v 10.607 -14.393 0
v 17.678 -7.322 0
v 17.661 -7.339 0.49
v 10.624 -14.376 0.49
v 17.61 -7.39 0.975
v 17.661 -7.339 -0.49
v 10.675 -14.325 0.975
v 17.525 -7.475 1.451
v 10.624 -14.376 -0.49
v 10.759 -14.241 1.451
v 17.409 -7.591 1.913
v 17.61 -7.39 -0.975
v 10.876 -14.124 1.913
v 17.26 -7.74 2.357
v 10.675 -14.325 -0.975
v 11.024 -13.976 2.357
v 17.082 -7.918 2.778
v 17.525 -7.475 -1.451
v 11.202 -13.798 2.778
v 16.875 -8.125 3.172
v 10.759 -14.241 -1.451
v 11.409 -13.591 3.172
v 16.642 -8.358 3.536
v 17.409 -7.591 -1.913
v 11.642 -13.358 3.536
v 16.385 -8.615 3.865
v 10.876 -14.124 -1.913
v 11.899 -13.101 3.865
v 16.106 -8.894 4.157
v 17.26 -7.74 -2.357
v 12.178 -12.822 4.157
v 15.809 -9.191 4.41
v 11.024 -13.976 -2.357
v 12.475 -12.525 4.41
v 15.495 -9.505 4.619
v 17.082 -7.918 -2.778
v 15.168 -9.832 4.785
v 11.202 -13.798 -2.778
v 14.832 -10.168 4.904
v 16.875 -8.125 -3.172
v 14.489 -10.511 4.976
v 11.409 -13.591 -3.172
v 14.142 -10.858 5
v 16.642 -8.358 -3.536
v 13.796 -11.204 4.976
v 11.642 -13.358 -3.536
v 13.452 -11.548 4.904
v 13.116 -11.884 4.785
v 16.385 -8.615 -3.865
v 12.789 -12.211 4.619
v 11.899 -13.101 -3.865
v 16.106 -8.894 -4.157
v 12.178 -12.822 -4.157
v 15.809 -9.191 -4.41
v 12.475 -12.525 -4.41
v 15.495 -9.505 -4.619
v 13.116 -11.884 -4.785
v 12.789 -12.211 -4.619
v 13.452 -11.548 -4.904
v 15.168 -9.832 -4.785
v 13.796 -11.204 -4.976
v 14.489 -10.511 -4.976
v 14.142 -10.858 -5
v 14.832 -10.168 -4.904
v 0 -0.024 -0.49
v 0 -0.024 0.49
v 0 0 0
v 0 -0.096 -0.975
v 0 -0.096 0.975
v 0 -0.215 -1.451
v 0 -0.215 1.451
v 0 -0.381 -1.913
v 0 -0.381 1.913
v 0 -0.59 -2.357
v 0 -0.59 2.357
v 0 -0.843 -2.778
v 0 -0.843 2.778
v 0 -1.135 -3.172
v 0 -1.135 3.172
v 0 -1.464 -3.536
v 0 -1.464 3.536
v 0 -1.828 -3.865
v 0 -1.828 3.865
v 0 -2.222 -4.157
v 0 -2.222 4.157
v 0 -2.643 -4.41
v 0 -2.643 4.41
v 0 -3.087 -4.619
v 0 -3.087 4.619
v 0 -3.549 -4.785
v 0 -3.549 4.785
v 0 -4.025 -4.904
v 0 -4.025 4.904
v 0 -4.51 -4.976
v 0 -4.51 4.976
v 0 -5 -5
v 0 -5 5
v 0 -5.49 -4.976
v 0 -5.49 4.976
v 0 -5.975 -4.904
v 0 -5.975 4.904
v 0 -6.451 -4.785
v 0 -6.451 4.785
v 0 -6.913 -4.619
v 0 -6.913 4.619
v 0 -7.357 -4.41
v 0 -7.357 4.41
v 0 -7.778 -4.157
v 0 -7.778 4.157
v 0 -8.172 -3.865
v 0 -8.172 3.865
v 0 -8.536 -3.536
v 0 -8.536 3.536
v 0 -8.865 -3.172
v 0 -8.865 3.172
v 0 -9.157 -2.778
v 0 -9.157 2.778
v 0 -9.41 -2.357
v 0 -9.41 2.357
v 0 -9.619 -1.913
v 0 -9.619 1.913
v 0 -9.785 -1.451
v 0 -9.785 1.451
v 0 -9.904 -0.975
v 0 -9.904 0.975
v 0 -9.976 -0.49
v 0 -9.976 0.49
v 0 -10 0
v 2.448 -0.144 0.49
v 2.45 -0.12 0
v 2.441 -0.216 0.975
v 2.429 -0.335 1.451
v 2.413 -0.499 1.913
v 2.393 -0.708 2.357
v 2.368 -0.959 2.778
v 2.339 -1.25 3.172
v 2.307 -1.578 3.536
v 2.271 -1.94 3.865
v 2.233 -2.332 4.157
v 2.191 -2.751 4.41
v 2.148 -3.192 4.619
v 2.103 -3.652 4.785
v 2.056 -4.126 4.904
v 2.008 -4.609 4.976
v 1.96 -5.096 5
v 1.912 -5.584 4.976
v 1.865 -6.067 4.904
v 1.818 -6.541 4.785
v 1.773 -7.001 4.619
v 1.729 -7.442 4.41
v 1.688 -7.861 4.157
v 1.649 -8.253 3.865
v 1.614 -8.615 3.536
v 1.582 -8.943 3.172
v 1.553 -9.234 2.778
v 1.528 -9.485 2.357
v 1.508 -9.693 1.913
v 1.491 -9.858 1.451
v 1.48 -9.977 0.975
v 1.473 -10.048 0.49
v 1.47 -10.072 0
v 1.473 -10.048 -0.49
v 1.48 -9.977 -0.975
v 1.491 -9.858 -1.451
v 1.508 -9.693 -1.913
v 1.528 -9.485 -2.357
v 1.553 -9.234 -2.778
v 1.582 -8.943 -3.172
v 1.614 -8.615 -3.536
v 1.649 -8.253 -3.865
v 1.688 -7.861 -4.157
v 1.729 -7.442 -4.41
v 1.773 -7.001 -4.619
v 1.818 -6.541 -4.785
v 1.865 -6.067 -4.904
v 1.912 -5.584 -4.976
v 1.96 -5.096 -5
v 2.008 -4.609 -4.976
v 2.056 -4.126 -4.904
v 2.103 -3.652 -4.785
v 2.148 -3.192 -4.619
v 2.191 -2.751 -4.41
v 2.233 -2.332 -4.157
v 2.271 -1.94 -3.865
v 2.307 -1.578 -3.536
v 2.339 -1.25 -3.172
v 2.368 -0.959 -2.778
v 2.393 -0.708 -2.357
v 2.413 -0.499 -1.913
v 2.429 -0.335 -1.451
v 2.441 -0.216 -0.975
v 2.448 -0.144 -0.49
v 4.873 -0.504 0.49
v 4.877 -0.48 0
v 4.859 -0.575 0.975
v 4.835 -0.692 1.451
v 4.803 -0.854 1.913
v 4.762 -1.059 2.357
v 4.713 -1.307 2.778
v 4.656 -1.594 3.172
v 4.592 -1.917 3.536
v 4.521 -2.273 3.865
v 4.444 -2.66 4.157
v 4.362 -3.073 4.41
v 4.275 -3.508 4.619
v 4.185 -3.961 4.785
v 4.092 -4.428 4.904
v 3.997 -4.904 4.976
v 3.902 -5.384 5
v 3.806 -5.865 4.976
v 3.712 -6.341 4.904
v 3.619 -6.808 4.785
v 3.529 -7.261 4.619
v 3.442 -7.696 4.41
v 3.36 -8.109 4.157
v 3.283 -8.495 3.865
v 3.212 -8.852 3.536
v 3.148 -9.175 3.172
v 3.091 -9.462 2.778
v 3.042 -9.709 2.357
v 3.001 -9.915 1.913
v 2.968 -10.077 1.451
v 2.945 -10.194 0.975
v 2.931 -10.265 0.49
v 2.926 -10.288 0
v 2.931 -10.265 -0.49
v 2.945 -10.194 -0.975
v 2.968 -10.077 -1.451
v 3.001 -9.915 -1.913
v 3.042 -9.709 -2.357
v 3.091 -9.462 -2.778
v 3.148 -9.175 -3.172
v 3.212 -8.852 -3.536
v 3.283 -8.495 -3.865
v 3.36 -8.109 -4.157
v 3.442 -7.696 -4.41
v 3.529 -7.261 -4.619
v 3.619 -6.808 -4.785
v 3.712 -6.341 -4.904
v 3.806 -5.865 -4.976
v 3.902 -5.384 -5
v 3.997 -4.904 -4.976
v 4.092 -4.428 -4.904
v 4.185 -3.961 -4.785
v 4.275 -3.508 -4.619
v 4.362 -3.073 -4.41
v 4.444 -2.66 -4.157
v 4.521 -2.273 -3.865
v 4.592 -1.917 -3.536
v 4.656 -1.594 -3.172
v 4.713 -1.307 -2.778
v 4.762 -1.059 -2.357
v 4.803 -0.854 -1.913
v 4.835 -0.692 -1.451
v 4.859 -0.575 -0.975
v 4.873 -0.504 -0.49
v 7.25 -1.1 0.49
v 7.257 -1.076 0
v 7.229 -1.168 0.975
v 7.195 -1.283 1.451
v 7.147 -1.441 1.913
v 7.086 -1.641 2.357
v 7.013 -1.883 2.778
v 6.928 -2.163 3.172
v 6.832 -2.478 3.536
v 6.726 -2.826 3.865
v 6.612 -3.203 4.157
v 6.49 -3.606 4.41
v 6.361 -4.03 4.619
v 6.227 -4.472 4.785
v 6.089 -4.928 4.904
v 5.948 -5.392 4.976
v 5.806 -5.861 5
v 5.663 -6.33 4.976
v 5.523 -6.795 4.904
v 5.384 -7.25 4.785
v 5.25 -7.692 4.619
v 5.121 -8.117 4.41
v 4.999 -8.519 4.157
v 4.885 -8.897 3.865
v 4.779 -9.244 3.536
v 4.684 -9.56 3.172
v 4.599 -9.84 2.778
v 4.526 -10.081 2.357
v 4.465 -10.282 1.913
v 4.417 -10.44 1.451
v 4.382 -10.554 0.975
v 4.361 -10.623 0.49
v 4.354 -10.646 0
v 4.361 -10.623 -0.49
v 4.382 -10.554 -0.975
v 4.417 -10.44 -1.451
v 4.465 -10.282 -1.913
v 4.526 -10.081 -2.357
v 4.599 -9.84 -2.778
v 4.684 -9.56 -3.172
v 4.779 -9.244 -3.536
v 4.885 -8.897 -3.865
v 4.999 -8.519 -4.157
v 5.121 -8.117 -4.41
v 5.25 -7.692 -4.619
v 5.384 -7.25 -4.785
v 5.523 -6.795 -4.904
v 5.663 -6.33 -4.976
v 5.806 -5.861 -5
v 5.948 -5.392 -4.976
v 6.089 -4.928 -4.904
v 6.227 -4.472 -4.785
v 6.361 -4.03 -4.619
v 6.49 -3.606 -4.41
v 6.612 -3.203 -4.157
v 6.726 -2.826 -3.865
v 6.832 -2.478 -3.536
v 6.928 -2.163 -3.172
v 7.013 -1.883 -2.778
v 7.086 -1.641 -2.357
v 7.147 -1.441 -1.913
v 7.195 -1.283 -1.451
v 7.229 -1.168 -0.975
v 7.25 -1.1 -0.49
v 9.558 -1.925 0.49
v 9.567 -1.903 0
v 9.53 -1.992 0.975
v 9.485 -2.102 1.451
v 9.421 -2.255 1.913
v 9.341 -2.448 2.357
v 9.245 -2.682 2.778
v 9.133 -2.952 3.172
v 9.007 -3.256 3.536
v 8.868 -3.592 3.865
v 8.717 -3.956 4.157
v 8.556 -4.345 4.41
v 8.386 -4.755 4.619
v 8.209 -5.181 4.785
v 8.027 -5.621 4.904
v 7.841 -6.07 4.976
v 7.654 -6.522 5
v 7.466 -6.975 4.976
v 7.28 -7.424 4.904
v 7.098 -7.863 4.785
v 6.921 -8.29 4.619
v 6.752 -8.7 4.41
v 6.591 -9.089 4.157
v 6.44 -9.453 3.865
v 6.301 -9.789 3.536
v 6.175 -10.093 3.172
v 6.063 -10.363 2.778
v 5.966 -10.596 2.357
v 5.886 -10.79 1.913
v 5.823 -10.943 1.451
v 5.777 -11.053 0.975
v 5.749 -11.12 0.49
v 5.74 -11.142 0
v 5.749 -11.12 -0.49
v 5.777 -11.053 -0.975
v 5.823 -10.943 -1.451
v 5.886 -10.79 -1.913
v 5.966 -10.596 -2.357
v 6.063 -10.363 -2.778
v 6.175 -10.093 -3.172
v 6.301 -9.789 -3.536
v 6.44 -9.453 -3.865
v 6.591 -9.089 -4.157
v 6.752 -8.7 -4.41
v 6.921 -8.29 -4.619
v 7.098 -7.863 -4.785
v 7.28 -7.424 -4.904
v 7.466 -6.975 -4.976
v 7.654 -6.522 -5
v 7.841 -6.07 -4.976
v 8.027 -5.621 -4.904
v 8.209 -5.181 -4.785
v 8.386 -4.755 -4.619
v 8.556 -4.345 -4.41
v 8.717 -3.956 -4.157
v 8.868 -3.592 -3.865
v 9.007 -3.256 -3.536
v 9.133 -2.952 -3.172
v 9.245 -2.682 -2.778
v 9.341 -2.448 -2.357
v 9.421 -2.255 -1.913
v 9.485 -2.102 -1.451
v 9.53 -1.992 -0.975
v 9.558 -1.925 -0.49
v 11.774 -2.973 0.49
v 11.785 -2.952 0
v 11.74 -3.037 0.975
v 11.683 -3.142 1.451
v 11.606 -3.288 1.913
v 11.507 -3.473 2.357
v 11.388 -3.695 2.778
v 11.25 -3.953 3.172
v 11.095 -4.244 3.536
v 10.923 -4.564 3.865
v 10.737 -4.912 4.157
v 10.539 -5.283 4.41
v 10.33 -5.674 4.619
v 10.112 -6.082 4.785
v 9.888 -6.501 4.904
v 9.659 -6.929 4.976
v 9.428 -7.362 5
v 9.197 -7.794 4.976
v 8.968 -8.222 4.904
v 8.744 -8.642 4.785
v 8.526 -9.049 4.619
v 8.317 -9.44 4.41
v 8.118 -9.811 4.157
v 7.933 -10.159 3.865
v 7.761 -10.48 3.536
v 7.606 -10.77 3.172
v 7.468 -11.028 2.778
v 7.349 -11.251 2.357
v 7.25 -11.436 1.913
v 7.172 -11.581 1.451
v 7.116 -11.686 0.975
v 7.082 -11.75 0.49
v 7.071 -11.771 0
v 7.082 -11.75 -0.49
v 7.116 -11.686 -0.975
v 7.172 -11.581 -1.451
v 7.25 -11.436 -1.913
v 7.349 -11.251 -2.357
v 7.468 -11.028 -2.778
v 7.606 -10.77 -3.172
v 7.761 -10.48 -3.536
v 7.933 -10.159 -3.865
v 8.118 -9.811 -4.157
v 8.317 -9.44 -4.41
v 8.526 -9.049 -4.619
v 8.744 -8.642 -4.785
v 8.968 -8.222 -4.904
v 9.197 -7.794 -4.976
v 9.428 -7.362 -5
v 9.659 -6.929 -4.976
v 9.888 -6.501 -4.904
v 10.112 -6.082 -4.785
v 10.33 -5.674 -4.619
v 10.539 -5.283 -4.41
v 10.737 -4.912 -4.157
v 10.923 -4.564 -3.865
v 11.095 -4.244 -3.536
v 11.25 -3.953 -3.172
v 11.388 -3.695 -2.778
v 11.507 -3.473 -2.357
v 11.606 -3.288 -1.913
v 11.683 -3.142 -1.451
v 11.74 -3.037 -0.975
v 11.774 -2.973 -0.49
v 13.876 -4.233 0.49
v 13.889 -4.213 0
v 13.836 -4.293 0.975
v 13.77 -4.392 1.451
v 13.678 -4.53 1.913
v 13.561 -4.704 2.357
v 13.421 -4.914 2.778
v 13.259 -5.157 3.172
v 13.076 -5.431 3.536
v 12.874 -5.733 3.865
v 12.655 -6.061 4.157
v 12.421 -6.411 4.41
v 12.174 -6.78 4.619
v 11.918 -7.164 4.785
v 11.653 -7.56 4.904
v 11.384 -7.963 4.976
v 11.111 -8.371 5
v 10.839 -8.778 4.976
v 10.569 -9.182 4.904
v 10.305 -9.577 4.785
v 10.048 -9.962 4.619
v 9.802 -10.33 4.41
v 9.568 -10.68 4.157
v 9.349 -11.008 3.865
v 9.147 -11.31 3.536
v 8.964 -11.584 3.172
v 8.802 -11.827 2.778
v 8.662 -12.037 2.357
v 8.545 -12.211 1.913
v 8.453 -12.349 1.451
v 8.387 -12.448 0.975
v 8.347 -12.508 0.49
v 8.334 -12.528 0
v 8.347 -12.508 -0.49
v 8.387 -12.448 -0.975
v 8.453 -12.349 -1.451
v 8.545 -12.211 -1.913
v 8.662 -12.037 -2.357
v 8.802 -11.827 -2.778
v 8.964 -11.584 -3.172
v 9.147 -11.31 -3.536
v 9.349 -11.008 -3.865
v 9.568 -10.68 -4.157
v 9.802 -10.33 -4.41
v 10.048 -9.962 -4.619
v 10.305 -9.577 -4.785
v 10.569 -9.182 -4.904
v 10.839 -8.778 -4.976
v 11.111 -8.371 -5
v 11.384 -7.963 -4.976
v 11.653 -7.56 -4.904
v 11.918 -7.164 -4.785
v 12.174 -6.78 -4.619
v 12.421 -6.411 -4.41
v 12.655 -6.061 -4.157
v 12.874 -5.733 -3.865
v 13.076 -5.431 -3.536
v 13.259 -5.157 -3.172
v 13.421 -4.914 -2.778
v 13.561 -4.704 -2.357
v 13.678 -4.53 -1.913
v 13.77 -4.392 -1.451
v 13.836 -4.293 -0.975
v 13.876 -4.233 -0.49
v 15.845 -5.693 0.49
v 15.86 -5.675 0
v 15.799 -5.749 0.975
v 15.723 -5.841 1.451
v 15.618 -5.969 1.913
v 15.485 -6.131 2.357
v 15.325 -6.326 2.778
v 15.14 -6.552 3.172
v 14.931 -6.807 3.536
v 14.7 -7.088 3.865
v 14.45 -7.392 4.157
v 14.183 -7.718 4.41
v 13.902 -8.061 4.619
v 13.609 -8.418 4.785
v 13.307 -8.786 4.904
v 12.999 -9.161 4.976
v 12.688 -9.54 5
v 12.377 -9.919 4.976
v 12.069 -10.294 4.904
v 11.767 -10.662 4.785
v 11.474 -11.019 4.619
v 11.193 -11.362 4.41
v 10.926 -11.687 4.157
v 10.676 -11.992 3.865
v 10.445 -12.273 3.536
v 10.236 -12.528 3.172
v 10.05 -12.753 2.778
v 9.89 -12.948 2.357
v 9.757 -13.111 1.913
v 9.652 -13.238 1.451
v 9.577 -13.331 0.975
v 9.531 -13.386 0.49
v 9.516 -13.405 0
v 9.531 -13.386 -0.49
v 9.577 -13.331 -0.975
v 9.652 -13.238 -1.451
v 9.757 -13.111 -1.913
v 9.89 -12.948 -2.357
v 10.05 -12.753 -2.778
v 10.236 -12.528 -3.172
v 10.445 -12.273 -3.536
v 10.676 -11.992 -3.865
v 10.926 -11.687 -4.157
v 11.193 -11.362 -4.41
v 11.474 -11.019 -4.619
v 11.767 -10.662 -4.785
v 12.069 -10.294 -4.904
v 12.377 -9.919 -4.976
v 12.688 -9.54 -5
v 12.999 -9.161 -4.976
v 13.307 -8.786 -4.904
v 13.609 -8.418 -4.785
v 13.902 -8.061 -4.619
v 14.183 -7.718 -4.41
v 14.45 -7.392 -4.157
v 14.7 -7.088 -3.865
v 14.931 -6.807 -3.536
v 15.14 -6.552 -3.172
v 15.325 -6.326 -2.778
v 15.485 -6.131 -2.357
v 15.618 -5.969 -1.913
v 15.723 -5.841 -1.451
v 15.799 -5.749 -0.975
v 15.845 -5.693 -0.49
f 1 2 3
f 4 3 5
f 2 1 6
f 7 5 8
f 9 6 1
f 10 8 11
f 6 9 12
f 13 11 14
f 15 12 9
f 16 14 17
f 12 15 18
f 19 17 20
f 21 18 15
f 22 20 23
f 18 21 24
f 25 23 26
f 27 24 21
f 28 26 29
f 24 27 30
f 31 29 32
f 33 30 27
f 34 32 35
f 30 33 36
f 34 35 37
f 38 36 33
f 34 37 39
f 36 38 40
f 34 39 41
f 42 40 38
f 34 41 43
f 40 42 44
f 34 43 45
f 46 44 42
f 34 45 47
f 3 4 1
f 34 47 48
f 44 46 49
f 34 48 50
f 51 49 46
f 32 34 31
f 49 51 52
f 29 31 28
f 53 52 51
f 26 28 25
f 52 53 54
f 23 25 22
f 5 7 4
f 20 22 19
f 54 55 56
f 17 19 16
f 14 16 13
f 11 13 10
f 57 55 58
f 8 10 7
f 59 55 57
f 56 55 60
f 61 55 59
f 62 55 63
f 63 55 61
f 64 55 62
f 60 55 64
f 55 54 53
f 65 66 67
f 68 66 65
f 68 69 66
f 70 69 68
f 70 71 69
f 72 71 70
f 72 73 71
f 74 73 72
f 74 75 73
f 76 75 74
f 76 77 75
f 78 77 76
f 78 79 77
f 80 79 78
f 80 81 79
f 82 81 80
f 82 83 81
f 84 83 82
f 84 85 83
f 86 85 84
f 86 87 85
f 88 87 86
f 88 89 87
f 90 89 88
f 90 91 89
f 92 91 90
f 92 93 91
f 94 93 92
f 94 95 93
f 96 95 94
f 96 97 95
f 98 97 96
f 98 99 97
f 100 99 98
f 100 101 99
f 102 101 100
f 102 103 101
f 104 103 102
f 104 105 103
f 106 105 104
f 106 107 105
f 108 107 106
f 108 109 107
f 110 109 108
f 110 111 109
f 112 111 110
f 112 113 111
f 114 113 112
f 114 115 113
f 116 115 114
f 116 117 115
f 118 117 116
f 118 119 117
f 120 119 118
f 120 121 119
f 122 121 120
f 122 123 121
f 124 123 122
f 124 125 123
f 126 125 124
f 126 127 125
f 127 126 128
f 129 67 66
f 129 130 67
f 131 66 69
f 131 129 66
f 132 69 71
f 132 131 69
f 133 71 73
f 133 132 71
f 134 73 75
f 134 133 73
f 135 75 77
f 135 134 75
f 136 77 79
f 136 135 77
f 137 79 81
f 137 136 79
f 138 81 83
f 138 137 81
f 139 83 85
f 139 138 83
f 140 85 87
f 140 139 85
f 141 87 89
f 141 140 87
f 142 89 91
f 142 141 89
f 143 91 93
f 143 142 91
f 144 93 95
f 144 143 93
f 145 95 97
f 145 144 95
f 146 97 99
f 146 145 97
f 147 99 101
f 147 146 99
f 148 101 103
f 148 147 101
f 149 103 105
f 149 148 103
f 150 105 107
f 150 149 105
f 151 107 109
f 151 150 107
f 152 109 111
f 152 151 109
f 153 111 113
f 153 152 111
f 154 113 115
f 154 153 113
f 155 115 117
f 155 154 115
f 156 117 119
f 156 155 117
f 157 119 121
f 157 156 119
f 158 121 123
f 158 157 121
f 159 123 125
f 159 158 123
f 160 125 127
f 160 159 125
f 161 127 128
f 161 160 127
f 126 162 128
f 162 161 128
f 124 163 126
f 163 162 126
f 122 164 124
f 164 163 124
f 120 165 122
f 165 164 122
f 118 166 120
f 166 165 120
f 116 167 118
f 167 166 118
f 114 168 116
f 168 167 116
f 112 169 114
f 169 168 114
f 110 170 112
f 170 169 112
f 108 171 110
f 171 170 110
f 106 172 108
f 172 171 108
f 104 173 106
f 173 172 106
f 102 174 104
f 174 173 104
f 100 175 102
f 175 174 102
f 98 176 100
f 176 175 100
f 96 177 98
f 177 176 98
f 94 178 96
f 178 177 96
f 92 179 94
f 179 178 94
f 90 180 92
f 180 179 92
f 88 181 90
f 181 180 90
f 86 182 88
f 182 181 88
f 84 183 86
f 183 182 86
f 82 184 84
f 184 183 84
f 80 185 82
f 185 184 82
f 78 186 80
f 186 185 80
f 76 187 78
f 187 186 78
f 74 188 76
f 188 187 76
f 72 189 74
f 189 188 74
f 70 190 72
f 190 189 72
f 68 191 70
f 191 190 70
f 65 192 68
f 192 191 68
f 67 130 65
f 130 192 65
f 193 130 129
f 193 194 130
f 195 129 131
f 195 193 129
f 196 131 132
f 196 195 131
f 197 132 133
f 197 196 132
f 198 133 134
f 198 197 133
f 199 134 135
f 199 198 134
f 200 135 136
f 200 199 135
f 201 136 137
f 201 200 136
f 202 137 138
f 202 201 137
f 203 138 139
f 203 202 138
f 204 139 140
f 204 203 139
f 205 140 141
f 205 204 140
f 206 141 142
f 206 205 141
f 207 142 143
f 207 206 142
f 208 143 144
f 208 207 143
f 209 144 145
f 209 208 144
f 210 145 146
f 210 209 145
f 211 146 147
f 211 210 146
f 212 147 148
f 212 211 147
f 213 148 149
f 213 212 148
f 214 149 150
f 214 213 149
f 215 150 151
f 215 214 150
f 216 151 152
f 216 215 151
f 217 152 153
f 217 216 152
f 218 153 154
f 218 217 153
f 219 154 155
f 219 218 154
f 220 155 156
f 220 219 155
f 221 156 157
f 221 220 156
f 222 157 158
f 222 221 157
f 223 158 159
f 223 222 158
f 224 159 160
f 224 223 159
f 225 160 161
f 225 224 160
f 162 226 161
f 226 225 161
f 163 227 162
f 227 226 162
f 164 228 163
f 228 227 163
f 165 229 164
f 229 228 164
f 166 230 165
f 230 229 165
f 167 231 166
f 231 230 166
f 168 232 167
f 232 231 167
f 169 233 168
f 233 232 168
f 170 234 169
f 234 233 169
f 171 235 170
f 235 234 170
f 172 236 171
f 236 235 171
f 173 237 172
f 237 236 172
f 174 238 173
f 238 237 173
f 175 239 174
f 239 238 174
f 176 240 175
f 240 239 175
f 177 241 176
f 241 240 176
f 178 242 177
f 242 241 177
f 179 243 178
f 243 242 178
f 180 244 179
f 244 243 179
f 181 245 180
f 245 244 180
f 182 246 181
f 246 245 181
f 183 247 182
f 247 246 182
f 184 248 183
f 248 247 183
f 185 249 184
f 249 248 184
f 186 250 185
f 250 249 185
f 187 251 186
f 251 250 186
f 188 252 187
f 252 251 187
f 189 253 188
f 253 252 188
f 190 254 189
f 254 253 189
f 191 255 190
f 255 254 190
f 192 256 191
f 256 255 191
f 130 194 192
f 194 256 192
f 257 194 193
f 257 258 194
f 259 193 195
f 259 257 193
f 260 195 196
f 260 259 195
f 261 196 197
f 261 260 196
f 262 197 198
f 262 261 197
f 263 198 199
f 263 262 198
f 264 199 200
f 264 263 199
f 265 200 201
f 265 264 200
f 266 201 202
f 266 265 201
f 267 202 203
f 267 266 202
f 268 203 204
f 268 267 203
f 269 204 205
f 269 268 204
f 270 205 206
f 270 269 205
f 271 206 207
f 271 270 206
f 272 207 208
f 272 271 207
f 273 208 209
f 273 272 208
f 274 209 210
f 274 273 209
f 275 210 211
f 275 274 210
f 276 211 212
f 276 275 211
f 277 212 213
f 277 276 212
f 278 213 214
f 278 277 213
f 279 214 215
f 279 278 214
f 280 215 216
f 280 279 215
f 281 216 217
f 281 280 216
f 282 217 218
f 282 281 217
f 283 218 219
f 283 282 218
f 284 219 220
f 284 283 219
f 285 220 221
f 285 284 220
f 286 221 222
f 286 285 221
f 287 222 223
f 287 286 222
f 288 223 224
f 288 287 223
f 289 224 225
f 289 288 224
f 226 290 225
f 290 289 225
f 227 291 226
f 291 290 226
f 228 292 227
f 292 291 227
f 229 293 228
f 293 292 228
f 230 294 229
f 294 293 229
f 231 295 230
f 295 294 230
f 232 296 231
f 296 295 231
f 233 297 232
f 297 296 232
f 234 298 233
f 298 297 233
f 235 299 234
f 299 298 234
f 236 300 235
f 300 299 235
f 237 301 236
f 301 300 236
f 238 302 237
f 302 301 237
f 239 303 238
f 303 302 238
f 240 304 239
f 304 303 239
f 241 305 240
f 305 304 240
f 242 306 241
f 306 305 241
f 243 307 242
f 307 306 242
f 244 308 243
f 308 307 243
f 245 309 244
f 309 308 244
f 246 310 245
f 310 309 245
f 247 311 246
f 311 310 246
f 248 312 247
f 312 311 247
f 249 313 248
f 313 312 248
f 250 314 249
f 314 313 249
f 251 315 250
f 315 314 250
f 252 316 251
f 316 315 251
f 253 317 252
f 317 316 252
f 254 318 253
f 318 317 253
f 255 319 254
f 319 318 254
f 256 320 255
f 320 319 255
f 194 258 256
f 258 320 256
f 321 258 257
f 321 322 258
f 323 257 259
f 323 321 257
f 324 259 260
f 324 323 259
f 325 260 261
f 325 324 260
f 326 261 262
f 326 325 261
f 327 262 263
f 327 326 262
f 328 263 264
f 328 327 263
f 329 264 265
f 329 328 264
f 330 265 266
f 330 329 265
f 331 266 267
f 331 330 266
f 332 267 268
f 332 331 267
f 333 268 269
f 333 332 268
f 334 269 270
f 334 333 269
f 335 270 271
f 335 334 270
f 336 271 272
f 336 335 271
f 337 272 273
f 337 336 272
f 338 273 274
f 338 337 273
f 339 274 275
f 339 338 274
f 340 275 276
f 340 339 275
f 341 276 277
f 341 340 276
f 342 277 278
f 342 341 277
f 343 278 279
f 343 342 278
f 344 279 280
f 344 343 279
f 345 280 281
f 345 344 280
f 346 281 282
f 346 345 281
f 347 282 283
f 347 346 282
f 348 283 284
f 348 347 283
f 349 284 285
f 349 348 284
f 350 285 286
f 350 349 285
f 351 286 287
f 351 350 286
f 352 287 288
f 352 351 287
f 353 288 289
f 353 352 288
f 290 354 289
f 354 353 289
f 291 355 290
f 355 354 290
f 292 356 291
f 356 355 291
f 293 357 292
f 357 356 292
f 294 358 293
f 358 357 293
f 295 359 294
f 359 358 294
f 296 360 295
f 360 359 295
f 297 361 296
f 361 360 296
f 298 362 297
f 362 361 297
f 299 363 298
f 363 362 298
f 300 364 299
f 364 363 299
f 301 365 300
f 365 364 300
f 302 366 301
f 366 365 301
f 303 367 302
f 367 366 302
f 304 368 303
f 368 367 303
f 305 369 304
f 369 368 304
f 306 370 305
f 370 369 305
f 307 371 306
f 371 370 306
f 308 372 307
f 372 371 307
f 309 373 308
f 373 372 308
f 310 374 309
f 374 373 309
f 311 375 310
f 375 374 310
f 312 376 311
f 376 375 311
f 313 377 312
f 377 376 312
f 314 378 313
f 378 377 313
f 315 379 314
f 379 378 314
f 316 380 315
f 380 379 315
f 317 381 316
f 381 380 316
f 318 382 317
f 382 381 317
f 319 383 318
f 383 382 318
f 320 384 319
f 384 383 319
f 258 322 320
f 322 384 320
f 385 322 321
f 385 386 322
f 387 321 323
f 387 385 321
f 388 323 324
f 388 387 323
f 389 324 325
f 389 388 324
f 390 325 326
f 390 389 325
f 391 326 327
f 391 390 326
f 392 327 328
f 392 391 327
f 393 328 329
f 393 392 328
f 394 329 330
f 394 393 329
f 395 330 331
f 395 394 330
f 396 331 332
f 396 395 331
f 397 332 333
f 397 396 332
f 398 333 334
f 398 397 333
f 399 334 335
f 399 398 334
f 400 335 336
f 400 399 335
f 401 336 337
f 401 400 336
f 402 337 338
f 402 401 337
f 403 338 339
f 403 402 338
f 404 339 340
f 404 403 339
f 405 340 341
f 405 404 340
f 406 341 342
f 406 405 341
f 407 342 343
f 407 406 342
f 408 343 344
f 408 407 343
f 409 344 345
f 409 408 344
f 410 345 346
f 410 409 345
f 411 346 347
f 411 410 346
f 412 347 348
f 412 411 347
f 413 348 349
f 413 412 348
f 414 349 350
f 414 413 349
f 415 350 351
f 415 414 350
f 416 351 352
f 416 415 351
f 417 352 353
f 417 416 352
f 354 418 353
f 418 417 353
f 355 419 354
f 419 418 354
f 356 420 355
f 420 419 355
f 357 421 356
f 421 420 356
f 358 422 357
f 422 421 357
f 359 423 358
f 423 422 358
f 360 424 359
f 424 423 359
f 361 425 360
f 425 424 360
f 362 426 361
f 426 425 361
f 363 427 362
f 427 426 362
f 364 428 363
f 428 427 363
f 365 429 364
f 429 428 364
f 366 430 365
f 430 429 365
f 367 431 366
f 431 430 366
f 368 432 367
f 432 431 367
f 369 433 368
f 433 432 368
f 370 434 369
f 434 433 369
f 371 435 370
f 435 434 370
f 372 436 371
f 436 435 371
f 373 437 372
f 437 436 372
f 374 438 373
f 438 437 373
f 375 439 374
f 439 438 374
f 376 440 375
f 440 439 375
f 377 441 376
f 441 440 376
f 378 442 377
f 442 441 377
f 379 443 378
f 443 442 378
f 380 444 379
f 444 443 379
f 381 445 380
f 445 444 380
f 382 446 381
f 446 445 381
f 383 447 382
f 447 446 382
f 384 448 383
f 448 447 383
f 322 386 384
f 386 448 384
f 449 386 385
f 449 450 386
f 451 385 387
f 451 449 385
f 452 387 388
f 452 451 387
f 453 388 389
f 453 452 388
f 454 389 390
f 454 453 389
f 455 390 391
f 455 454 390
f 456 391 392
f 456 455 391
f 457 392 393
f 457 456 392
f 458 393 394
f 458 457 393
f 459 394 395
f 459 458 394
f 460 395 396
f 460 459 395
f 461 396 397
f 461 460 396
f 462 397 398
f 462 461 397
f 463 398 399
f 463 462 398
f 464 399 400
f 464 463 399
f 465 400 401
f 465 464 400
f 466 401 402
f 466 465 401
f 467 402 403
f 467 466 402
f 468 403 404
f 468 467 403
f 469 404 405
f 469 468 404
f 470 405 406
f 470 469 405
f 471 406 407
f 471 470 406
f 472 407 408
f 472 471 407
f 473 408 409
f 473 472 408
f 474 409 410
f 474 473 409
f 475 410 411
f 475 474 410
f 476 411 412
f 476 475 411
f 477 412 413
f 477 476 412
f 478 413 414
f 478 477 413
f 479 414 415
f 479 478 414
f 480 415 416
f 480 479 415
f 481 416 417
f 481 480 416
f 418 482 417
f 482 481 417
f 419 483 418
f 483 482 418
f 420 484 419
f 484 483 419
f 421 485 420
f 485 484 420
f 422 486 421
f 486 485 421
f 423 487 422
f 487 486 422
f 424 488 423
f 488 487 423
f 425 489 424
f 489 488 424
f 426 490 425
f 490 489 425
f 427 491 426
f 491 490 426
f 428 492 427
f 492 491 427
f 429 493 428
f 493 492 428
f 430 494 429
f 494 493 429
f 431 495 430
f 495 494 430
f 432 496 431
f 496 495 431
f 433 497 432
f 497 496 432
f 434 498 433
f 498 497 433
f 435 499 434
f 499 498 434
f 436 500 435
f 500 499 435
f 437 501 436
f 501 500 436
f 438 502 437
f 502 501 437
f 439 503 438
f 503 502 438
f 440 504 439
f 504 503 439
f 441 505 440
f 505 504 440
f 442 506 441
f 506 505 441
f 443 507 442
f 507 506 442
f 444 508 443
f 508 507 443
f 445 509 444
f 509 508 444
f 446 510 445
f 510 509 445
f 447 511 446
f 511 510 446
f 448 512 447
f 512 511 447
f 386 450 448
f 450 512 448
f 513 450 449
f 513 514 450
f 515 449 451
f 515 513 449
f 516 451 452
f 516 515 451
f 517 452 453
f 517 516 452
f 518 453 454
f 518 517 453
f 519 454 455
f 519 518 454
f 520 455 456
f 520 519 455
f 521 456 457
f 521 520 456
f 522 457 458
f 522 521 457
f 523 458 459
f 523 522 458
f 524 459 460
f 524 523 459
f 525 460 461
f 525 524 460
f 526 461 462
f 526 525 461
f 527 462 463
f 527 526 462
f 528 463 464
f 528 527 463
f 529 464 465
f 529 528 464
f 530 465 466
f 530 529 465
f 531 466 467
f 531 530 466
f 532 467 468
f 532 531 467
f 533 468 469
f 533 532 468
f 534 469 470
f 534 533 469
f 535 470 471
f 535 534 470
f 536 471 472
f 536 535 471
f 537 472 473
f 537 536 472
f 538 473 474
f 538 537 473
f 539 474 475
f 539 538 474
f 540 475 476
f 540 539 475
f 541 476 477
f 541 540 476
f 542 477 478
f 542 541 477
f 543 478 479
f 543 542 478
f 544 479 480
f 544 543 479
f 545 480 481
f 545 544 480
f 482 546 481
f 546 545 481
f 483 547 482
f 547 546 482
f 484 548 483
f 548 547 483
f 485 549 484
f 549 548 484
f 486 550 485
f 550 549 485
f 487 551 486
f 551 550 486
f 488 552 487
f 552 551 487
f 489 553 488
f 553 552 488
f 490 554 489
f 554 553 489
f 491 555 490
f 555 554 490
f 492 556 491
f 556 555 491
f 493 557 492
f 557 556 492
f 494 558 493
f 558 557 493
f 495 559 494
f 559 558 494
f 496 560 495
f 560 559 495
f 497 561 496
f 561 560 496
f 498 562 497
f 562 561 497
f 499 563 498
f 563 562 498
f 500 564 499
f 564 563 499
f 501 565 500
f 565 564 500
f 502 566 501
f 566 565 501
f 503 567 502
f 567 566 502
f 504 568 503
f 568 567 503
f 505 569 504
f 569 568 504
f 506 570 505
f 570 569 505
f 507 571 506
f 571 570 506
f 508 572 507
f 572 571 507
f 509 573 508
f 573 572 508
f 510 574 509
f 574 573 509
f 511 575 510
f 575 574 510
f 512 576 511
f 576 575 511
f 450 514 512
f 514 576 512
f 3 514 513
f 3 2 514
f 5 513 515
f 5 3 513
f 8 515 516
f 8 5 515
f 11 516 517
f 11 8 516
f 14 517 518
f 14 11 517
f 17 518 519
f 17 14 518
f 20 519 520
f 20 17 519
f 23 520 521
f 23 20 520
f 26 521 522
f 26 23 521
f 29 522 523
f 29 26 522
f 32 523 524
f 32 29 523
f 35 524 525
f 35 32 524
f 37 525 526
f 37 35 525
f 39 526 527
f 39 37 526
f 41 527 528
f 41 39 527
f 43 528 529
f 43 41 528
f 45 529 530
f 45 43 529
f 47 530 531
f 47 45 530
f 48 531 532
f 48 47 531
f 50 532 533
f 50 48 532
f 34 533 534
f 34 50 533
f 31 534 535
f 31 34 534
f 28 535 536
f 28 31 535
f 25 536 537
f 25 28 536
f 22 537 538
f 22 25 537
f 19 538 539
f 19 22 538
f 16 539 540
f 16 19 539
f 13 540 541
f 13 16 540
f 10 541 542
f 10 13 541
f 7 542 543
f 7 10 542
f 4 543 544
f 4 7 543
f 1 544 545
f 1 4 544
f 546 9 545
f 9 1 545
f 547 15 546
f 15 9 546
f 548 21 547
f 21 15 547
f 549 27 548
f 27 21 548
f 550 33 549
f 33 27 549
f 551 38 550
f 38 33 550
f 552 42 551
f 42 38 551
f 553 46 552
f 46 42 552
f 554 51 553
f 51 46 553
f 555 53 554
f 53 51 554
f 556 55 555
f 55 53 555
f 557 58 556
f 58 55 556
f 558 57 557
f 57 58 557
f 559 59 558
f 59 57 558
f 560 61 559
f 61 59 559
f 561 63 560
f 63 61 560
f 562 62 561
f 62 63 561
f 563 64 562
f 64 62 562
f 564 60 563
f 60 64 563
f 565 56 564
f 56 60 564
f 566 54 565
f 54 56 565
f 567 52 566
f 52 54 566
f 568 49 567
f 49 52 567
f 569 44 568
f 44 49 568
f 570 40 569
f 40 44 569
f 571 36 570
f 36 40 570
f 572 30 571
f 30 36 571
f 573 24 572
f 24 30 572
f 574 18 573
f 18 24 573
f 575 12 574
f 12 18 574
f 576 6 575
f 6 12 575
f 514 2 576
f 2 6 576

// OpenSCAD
// file: Torus.scad
// Auther: Tobias Grundtvig
// Date: Oct 1, 2020
//
// A Torus

Torus(small_diameter=10, big_diameter=40, t_z="pos", t_y="neg", angular_resolution=64);

module Torus(   small_diameter,
                big_diameter,
                t_x="center",
                t_y="center",
                t_z="center",
                angular_resolution=32)
{
    tx = t_x == "neg" ? -0.5*big_diameter - 0.5*small_diameter : 
            t_x == "pos" ? 0.5*big_diameter + 0.5*small_diameter : 0;
    ty = t_y == "neg" ? -0.5*big_diameter - 0.5*small_diameter : 
            t_y == "pos" ? 0.5*big_diameter + 0.5*small_diameter : 0;
    tz = t_z == "neg" ? -0.5*small_diameter : 
            t_z == "pos" ? 0.5*small_diameter : 0;
    translate([tx, ty, tz])
        rotate_extrude(convexity = 10, $fn=angular_resolution)
            translate([0.5*big_diameter, 0, 0])
                circle(r = 0.5*small_diameter, $fn=angular_resolution);
    
}
// file: Pie_2D.scad
// Auther: Tobias Grundtvig
// Date: Oct 1, 2020
//
//  A 2-dimensional pie
//  can be used to linear-extract a 3D Pie


Pie_2D(diameter=10, from_angle=45, to_angle=315, steps=32);
translate([2,0,0])
Pie_2D(diameter=10, from_angle=315, to_angle=45, steps=32);

module Pie_2D(diameter, from_angle, to_angle, steps=32)
{
    step_size = from_angle < to_angle ?
                (to_angle-from_angle)/steps :
                (360 - (from_angle-to_angle))/steps;
    r=diameter/2;
    points = from_angle < to_angle ?
        [
            for(i = [0:steps])
            [r * cos(from_angle+i*step_size), r * sin(from_angle+i*step_size)]
        ] :
        [
            for(i = [0:steps])
            [r * cos(from_angle+i*step_size), r * sin(from_angle+i*step_size)]
        ];
            
    polygon(concat([[0, 0]], points));
}
// main file
// Auther: Tobias Grundtvig
// Date: Oct 1, 2020
//
// A segment of a flat ring

use <Pie_2D.scad>
use <Torus.scad>

Torus_Segment(  small_diameter=10,
                big_diameter=40,
                from_angle=45,
                to_angle=90,
                t_y="neg",
                angular_resolution=64);

module Torus_Segment(   small_diameter,
                        big_diameter,
                        from_angle,
                        to_angle,
                        t_x="center",
                        t_y="center",
                        t_z="center",
                        angular_resolution=32)
{
    tx = t_x == "neg" ? -0.5*big_diameter - 0.5*small_diameter : 
            t_x == "pos" ? 0.5*big_diameter + 0.5*small_diameter : 0;
    ty = t_y == "neg" ? -0.5*big_diameter - 0.5*small_diameter : 
            t_y == "pos" ? 0.5*big_diameter + 0.5*small_diameter : 0;
    tz = t_z == "neg" ? -0.5*small_diameter : 
            t_z == "pos" ? 0.5*small_diameter : 0;
    translate([tx, ty, tz])
    intersection()
    {
        linear_extrude(height=small_diameter+2, center=true)
        {
            Pie_2D
            (
                diameter=(small_diameter+big_diameter)*2,
                from_angle=from_angle,
                to_angle=to_angle,
                steps = 8
            );
        }
        Torus(  small_diameter=small_diameter,
                big_diameter=big_diameter,
                angular_resolution=angular_resolution);
    }
}
